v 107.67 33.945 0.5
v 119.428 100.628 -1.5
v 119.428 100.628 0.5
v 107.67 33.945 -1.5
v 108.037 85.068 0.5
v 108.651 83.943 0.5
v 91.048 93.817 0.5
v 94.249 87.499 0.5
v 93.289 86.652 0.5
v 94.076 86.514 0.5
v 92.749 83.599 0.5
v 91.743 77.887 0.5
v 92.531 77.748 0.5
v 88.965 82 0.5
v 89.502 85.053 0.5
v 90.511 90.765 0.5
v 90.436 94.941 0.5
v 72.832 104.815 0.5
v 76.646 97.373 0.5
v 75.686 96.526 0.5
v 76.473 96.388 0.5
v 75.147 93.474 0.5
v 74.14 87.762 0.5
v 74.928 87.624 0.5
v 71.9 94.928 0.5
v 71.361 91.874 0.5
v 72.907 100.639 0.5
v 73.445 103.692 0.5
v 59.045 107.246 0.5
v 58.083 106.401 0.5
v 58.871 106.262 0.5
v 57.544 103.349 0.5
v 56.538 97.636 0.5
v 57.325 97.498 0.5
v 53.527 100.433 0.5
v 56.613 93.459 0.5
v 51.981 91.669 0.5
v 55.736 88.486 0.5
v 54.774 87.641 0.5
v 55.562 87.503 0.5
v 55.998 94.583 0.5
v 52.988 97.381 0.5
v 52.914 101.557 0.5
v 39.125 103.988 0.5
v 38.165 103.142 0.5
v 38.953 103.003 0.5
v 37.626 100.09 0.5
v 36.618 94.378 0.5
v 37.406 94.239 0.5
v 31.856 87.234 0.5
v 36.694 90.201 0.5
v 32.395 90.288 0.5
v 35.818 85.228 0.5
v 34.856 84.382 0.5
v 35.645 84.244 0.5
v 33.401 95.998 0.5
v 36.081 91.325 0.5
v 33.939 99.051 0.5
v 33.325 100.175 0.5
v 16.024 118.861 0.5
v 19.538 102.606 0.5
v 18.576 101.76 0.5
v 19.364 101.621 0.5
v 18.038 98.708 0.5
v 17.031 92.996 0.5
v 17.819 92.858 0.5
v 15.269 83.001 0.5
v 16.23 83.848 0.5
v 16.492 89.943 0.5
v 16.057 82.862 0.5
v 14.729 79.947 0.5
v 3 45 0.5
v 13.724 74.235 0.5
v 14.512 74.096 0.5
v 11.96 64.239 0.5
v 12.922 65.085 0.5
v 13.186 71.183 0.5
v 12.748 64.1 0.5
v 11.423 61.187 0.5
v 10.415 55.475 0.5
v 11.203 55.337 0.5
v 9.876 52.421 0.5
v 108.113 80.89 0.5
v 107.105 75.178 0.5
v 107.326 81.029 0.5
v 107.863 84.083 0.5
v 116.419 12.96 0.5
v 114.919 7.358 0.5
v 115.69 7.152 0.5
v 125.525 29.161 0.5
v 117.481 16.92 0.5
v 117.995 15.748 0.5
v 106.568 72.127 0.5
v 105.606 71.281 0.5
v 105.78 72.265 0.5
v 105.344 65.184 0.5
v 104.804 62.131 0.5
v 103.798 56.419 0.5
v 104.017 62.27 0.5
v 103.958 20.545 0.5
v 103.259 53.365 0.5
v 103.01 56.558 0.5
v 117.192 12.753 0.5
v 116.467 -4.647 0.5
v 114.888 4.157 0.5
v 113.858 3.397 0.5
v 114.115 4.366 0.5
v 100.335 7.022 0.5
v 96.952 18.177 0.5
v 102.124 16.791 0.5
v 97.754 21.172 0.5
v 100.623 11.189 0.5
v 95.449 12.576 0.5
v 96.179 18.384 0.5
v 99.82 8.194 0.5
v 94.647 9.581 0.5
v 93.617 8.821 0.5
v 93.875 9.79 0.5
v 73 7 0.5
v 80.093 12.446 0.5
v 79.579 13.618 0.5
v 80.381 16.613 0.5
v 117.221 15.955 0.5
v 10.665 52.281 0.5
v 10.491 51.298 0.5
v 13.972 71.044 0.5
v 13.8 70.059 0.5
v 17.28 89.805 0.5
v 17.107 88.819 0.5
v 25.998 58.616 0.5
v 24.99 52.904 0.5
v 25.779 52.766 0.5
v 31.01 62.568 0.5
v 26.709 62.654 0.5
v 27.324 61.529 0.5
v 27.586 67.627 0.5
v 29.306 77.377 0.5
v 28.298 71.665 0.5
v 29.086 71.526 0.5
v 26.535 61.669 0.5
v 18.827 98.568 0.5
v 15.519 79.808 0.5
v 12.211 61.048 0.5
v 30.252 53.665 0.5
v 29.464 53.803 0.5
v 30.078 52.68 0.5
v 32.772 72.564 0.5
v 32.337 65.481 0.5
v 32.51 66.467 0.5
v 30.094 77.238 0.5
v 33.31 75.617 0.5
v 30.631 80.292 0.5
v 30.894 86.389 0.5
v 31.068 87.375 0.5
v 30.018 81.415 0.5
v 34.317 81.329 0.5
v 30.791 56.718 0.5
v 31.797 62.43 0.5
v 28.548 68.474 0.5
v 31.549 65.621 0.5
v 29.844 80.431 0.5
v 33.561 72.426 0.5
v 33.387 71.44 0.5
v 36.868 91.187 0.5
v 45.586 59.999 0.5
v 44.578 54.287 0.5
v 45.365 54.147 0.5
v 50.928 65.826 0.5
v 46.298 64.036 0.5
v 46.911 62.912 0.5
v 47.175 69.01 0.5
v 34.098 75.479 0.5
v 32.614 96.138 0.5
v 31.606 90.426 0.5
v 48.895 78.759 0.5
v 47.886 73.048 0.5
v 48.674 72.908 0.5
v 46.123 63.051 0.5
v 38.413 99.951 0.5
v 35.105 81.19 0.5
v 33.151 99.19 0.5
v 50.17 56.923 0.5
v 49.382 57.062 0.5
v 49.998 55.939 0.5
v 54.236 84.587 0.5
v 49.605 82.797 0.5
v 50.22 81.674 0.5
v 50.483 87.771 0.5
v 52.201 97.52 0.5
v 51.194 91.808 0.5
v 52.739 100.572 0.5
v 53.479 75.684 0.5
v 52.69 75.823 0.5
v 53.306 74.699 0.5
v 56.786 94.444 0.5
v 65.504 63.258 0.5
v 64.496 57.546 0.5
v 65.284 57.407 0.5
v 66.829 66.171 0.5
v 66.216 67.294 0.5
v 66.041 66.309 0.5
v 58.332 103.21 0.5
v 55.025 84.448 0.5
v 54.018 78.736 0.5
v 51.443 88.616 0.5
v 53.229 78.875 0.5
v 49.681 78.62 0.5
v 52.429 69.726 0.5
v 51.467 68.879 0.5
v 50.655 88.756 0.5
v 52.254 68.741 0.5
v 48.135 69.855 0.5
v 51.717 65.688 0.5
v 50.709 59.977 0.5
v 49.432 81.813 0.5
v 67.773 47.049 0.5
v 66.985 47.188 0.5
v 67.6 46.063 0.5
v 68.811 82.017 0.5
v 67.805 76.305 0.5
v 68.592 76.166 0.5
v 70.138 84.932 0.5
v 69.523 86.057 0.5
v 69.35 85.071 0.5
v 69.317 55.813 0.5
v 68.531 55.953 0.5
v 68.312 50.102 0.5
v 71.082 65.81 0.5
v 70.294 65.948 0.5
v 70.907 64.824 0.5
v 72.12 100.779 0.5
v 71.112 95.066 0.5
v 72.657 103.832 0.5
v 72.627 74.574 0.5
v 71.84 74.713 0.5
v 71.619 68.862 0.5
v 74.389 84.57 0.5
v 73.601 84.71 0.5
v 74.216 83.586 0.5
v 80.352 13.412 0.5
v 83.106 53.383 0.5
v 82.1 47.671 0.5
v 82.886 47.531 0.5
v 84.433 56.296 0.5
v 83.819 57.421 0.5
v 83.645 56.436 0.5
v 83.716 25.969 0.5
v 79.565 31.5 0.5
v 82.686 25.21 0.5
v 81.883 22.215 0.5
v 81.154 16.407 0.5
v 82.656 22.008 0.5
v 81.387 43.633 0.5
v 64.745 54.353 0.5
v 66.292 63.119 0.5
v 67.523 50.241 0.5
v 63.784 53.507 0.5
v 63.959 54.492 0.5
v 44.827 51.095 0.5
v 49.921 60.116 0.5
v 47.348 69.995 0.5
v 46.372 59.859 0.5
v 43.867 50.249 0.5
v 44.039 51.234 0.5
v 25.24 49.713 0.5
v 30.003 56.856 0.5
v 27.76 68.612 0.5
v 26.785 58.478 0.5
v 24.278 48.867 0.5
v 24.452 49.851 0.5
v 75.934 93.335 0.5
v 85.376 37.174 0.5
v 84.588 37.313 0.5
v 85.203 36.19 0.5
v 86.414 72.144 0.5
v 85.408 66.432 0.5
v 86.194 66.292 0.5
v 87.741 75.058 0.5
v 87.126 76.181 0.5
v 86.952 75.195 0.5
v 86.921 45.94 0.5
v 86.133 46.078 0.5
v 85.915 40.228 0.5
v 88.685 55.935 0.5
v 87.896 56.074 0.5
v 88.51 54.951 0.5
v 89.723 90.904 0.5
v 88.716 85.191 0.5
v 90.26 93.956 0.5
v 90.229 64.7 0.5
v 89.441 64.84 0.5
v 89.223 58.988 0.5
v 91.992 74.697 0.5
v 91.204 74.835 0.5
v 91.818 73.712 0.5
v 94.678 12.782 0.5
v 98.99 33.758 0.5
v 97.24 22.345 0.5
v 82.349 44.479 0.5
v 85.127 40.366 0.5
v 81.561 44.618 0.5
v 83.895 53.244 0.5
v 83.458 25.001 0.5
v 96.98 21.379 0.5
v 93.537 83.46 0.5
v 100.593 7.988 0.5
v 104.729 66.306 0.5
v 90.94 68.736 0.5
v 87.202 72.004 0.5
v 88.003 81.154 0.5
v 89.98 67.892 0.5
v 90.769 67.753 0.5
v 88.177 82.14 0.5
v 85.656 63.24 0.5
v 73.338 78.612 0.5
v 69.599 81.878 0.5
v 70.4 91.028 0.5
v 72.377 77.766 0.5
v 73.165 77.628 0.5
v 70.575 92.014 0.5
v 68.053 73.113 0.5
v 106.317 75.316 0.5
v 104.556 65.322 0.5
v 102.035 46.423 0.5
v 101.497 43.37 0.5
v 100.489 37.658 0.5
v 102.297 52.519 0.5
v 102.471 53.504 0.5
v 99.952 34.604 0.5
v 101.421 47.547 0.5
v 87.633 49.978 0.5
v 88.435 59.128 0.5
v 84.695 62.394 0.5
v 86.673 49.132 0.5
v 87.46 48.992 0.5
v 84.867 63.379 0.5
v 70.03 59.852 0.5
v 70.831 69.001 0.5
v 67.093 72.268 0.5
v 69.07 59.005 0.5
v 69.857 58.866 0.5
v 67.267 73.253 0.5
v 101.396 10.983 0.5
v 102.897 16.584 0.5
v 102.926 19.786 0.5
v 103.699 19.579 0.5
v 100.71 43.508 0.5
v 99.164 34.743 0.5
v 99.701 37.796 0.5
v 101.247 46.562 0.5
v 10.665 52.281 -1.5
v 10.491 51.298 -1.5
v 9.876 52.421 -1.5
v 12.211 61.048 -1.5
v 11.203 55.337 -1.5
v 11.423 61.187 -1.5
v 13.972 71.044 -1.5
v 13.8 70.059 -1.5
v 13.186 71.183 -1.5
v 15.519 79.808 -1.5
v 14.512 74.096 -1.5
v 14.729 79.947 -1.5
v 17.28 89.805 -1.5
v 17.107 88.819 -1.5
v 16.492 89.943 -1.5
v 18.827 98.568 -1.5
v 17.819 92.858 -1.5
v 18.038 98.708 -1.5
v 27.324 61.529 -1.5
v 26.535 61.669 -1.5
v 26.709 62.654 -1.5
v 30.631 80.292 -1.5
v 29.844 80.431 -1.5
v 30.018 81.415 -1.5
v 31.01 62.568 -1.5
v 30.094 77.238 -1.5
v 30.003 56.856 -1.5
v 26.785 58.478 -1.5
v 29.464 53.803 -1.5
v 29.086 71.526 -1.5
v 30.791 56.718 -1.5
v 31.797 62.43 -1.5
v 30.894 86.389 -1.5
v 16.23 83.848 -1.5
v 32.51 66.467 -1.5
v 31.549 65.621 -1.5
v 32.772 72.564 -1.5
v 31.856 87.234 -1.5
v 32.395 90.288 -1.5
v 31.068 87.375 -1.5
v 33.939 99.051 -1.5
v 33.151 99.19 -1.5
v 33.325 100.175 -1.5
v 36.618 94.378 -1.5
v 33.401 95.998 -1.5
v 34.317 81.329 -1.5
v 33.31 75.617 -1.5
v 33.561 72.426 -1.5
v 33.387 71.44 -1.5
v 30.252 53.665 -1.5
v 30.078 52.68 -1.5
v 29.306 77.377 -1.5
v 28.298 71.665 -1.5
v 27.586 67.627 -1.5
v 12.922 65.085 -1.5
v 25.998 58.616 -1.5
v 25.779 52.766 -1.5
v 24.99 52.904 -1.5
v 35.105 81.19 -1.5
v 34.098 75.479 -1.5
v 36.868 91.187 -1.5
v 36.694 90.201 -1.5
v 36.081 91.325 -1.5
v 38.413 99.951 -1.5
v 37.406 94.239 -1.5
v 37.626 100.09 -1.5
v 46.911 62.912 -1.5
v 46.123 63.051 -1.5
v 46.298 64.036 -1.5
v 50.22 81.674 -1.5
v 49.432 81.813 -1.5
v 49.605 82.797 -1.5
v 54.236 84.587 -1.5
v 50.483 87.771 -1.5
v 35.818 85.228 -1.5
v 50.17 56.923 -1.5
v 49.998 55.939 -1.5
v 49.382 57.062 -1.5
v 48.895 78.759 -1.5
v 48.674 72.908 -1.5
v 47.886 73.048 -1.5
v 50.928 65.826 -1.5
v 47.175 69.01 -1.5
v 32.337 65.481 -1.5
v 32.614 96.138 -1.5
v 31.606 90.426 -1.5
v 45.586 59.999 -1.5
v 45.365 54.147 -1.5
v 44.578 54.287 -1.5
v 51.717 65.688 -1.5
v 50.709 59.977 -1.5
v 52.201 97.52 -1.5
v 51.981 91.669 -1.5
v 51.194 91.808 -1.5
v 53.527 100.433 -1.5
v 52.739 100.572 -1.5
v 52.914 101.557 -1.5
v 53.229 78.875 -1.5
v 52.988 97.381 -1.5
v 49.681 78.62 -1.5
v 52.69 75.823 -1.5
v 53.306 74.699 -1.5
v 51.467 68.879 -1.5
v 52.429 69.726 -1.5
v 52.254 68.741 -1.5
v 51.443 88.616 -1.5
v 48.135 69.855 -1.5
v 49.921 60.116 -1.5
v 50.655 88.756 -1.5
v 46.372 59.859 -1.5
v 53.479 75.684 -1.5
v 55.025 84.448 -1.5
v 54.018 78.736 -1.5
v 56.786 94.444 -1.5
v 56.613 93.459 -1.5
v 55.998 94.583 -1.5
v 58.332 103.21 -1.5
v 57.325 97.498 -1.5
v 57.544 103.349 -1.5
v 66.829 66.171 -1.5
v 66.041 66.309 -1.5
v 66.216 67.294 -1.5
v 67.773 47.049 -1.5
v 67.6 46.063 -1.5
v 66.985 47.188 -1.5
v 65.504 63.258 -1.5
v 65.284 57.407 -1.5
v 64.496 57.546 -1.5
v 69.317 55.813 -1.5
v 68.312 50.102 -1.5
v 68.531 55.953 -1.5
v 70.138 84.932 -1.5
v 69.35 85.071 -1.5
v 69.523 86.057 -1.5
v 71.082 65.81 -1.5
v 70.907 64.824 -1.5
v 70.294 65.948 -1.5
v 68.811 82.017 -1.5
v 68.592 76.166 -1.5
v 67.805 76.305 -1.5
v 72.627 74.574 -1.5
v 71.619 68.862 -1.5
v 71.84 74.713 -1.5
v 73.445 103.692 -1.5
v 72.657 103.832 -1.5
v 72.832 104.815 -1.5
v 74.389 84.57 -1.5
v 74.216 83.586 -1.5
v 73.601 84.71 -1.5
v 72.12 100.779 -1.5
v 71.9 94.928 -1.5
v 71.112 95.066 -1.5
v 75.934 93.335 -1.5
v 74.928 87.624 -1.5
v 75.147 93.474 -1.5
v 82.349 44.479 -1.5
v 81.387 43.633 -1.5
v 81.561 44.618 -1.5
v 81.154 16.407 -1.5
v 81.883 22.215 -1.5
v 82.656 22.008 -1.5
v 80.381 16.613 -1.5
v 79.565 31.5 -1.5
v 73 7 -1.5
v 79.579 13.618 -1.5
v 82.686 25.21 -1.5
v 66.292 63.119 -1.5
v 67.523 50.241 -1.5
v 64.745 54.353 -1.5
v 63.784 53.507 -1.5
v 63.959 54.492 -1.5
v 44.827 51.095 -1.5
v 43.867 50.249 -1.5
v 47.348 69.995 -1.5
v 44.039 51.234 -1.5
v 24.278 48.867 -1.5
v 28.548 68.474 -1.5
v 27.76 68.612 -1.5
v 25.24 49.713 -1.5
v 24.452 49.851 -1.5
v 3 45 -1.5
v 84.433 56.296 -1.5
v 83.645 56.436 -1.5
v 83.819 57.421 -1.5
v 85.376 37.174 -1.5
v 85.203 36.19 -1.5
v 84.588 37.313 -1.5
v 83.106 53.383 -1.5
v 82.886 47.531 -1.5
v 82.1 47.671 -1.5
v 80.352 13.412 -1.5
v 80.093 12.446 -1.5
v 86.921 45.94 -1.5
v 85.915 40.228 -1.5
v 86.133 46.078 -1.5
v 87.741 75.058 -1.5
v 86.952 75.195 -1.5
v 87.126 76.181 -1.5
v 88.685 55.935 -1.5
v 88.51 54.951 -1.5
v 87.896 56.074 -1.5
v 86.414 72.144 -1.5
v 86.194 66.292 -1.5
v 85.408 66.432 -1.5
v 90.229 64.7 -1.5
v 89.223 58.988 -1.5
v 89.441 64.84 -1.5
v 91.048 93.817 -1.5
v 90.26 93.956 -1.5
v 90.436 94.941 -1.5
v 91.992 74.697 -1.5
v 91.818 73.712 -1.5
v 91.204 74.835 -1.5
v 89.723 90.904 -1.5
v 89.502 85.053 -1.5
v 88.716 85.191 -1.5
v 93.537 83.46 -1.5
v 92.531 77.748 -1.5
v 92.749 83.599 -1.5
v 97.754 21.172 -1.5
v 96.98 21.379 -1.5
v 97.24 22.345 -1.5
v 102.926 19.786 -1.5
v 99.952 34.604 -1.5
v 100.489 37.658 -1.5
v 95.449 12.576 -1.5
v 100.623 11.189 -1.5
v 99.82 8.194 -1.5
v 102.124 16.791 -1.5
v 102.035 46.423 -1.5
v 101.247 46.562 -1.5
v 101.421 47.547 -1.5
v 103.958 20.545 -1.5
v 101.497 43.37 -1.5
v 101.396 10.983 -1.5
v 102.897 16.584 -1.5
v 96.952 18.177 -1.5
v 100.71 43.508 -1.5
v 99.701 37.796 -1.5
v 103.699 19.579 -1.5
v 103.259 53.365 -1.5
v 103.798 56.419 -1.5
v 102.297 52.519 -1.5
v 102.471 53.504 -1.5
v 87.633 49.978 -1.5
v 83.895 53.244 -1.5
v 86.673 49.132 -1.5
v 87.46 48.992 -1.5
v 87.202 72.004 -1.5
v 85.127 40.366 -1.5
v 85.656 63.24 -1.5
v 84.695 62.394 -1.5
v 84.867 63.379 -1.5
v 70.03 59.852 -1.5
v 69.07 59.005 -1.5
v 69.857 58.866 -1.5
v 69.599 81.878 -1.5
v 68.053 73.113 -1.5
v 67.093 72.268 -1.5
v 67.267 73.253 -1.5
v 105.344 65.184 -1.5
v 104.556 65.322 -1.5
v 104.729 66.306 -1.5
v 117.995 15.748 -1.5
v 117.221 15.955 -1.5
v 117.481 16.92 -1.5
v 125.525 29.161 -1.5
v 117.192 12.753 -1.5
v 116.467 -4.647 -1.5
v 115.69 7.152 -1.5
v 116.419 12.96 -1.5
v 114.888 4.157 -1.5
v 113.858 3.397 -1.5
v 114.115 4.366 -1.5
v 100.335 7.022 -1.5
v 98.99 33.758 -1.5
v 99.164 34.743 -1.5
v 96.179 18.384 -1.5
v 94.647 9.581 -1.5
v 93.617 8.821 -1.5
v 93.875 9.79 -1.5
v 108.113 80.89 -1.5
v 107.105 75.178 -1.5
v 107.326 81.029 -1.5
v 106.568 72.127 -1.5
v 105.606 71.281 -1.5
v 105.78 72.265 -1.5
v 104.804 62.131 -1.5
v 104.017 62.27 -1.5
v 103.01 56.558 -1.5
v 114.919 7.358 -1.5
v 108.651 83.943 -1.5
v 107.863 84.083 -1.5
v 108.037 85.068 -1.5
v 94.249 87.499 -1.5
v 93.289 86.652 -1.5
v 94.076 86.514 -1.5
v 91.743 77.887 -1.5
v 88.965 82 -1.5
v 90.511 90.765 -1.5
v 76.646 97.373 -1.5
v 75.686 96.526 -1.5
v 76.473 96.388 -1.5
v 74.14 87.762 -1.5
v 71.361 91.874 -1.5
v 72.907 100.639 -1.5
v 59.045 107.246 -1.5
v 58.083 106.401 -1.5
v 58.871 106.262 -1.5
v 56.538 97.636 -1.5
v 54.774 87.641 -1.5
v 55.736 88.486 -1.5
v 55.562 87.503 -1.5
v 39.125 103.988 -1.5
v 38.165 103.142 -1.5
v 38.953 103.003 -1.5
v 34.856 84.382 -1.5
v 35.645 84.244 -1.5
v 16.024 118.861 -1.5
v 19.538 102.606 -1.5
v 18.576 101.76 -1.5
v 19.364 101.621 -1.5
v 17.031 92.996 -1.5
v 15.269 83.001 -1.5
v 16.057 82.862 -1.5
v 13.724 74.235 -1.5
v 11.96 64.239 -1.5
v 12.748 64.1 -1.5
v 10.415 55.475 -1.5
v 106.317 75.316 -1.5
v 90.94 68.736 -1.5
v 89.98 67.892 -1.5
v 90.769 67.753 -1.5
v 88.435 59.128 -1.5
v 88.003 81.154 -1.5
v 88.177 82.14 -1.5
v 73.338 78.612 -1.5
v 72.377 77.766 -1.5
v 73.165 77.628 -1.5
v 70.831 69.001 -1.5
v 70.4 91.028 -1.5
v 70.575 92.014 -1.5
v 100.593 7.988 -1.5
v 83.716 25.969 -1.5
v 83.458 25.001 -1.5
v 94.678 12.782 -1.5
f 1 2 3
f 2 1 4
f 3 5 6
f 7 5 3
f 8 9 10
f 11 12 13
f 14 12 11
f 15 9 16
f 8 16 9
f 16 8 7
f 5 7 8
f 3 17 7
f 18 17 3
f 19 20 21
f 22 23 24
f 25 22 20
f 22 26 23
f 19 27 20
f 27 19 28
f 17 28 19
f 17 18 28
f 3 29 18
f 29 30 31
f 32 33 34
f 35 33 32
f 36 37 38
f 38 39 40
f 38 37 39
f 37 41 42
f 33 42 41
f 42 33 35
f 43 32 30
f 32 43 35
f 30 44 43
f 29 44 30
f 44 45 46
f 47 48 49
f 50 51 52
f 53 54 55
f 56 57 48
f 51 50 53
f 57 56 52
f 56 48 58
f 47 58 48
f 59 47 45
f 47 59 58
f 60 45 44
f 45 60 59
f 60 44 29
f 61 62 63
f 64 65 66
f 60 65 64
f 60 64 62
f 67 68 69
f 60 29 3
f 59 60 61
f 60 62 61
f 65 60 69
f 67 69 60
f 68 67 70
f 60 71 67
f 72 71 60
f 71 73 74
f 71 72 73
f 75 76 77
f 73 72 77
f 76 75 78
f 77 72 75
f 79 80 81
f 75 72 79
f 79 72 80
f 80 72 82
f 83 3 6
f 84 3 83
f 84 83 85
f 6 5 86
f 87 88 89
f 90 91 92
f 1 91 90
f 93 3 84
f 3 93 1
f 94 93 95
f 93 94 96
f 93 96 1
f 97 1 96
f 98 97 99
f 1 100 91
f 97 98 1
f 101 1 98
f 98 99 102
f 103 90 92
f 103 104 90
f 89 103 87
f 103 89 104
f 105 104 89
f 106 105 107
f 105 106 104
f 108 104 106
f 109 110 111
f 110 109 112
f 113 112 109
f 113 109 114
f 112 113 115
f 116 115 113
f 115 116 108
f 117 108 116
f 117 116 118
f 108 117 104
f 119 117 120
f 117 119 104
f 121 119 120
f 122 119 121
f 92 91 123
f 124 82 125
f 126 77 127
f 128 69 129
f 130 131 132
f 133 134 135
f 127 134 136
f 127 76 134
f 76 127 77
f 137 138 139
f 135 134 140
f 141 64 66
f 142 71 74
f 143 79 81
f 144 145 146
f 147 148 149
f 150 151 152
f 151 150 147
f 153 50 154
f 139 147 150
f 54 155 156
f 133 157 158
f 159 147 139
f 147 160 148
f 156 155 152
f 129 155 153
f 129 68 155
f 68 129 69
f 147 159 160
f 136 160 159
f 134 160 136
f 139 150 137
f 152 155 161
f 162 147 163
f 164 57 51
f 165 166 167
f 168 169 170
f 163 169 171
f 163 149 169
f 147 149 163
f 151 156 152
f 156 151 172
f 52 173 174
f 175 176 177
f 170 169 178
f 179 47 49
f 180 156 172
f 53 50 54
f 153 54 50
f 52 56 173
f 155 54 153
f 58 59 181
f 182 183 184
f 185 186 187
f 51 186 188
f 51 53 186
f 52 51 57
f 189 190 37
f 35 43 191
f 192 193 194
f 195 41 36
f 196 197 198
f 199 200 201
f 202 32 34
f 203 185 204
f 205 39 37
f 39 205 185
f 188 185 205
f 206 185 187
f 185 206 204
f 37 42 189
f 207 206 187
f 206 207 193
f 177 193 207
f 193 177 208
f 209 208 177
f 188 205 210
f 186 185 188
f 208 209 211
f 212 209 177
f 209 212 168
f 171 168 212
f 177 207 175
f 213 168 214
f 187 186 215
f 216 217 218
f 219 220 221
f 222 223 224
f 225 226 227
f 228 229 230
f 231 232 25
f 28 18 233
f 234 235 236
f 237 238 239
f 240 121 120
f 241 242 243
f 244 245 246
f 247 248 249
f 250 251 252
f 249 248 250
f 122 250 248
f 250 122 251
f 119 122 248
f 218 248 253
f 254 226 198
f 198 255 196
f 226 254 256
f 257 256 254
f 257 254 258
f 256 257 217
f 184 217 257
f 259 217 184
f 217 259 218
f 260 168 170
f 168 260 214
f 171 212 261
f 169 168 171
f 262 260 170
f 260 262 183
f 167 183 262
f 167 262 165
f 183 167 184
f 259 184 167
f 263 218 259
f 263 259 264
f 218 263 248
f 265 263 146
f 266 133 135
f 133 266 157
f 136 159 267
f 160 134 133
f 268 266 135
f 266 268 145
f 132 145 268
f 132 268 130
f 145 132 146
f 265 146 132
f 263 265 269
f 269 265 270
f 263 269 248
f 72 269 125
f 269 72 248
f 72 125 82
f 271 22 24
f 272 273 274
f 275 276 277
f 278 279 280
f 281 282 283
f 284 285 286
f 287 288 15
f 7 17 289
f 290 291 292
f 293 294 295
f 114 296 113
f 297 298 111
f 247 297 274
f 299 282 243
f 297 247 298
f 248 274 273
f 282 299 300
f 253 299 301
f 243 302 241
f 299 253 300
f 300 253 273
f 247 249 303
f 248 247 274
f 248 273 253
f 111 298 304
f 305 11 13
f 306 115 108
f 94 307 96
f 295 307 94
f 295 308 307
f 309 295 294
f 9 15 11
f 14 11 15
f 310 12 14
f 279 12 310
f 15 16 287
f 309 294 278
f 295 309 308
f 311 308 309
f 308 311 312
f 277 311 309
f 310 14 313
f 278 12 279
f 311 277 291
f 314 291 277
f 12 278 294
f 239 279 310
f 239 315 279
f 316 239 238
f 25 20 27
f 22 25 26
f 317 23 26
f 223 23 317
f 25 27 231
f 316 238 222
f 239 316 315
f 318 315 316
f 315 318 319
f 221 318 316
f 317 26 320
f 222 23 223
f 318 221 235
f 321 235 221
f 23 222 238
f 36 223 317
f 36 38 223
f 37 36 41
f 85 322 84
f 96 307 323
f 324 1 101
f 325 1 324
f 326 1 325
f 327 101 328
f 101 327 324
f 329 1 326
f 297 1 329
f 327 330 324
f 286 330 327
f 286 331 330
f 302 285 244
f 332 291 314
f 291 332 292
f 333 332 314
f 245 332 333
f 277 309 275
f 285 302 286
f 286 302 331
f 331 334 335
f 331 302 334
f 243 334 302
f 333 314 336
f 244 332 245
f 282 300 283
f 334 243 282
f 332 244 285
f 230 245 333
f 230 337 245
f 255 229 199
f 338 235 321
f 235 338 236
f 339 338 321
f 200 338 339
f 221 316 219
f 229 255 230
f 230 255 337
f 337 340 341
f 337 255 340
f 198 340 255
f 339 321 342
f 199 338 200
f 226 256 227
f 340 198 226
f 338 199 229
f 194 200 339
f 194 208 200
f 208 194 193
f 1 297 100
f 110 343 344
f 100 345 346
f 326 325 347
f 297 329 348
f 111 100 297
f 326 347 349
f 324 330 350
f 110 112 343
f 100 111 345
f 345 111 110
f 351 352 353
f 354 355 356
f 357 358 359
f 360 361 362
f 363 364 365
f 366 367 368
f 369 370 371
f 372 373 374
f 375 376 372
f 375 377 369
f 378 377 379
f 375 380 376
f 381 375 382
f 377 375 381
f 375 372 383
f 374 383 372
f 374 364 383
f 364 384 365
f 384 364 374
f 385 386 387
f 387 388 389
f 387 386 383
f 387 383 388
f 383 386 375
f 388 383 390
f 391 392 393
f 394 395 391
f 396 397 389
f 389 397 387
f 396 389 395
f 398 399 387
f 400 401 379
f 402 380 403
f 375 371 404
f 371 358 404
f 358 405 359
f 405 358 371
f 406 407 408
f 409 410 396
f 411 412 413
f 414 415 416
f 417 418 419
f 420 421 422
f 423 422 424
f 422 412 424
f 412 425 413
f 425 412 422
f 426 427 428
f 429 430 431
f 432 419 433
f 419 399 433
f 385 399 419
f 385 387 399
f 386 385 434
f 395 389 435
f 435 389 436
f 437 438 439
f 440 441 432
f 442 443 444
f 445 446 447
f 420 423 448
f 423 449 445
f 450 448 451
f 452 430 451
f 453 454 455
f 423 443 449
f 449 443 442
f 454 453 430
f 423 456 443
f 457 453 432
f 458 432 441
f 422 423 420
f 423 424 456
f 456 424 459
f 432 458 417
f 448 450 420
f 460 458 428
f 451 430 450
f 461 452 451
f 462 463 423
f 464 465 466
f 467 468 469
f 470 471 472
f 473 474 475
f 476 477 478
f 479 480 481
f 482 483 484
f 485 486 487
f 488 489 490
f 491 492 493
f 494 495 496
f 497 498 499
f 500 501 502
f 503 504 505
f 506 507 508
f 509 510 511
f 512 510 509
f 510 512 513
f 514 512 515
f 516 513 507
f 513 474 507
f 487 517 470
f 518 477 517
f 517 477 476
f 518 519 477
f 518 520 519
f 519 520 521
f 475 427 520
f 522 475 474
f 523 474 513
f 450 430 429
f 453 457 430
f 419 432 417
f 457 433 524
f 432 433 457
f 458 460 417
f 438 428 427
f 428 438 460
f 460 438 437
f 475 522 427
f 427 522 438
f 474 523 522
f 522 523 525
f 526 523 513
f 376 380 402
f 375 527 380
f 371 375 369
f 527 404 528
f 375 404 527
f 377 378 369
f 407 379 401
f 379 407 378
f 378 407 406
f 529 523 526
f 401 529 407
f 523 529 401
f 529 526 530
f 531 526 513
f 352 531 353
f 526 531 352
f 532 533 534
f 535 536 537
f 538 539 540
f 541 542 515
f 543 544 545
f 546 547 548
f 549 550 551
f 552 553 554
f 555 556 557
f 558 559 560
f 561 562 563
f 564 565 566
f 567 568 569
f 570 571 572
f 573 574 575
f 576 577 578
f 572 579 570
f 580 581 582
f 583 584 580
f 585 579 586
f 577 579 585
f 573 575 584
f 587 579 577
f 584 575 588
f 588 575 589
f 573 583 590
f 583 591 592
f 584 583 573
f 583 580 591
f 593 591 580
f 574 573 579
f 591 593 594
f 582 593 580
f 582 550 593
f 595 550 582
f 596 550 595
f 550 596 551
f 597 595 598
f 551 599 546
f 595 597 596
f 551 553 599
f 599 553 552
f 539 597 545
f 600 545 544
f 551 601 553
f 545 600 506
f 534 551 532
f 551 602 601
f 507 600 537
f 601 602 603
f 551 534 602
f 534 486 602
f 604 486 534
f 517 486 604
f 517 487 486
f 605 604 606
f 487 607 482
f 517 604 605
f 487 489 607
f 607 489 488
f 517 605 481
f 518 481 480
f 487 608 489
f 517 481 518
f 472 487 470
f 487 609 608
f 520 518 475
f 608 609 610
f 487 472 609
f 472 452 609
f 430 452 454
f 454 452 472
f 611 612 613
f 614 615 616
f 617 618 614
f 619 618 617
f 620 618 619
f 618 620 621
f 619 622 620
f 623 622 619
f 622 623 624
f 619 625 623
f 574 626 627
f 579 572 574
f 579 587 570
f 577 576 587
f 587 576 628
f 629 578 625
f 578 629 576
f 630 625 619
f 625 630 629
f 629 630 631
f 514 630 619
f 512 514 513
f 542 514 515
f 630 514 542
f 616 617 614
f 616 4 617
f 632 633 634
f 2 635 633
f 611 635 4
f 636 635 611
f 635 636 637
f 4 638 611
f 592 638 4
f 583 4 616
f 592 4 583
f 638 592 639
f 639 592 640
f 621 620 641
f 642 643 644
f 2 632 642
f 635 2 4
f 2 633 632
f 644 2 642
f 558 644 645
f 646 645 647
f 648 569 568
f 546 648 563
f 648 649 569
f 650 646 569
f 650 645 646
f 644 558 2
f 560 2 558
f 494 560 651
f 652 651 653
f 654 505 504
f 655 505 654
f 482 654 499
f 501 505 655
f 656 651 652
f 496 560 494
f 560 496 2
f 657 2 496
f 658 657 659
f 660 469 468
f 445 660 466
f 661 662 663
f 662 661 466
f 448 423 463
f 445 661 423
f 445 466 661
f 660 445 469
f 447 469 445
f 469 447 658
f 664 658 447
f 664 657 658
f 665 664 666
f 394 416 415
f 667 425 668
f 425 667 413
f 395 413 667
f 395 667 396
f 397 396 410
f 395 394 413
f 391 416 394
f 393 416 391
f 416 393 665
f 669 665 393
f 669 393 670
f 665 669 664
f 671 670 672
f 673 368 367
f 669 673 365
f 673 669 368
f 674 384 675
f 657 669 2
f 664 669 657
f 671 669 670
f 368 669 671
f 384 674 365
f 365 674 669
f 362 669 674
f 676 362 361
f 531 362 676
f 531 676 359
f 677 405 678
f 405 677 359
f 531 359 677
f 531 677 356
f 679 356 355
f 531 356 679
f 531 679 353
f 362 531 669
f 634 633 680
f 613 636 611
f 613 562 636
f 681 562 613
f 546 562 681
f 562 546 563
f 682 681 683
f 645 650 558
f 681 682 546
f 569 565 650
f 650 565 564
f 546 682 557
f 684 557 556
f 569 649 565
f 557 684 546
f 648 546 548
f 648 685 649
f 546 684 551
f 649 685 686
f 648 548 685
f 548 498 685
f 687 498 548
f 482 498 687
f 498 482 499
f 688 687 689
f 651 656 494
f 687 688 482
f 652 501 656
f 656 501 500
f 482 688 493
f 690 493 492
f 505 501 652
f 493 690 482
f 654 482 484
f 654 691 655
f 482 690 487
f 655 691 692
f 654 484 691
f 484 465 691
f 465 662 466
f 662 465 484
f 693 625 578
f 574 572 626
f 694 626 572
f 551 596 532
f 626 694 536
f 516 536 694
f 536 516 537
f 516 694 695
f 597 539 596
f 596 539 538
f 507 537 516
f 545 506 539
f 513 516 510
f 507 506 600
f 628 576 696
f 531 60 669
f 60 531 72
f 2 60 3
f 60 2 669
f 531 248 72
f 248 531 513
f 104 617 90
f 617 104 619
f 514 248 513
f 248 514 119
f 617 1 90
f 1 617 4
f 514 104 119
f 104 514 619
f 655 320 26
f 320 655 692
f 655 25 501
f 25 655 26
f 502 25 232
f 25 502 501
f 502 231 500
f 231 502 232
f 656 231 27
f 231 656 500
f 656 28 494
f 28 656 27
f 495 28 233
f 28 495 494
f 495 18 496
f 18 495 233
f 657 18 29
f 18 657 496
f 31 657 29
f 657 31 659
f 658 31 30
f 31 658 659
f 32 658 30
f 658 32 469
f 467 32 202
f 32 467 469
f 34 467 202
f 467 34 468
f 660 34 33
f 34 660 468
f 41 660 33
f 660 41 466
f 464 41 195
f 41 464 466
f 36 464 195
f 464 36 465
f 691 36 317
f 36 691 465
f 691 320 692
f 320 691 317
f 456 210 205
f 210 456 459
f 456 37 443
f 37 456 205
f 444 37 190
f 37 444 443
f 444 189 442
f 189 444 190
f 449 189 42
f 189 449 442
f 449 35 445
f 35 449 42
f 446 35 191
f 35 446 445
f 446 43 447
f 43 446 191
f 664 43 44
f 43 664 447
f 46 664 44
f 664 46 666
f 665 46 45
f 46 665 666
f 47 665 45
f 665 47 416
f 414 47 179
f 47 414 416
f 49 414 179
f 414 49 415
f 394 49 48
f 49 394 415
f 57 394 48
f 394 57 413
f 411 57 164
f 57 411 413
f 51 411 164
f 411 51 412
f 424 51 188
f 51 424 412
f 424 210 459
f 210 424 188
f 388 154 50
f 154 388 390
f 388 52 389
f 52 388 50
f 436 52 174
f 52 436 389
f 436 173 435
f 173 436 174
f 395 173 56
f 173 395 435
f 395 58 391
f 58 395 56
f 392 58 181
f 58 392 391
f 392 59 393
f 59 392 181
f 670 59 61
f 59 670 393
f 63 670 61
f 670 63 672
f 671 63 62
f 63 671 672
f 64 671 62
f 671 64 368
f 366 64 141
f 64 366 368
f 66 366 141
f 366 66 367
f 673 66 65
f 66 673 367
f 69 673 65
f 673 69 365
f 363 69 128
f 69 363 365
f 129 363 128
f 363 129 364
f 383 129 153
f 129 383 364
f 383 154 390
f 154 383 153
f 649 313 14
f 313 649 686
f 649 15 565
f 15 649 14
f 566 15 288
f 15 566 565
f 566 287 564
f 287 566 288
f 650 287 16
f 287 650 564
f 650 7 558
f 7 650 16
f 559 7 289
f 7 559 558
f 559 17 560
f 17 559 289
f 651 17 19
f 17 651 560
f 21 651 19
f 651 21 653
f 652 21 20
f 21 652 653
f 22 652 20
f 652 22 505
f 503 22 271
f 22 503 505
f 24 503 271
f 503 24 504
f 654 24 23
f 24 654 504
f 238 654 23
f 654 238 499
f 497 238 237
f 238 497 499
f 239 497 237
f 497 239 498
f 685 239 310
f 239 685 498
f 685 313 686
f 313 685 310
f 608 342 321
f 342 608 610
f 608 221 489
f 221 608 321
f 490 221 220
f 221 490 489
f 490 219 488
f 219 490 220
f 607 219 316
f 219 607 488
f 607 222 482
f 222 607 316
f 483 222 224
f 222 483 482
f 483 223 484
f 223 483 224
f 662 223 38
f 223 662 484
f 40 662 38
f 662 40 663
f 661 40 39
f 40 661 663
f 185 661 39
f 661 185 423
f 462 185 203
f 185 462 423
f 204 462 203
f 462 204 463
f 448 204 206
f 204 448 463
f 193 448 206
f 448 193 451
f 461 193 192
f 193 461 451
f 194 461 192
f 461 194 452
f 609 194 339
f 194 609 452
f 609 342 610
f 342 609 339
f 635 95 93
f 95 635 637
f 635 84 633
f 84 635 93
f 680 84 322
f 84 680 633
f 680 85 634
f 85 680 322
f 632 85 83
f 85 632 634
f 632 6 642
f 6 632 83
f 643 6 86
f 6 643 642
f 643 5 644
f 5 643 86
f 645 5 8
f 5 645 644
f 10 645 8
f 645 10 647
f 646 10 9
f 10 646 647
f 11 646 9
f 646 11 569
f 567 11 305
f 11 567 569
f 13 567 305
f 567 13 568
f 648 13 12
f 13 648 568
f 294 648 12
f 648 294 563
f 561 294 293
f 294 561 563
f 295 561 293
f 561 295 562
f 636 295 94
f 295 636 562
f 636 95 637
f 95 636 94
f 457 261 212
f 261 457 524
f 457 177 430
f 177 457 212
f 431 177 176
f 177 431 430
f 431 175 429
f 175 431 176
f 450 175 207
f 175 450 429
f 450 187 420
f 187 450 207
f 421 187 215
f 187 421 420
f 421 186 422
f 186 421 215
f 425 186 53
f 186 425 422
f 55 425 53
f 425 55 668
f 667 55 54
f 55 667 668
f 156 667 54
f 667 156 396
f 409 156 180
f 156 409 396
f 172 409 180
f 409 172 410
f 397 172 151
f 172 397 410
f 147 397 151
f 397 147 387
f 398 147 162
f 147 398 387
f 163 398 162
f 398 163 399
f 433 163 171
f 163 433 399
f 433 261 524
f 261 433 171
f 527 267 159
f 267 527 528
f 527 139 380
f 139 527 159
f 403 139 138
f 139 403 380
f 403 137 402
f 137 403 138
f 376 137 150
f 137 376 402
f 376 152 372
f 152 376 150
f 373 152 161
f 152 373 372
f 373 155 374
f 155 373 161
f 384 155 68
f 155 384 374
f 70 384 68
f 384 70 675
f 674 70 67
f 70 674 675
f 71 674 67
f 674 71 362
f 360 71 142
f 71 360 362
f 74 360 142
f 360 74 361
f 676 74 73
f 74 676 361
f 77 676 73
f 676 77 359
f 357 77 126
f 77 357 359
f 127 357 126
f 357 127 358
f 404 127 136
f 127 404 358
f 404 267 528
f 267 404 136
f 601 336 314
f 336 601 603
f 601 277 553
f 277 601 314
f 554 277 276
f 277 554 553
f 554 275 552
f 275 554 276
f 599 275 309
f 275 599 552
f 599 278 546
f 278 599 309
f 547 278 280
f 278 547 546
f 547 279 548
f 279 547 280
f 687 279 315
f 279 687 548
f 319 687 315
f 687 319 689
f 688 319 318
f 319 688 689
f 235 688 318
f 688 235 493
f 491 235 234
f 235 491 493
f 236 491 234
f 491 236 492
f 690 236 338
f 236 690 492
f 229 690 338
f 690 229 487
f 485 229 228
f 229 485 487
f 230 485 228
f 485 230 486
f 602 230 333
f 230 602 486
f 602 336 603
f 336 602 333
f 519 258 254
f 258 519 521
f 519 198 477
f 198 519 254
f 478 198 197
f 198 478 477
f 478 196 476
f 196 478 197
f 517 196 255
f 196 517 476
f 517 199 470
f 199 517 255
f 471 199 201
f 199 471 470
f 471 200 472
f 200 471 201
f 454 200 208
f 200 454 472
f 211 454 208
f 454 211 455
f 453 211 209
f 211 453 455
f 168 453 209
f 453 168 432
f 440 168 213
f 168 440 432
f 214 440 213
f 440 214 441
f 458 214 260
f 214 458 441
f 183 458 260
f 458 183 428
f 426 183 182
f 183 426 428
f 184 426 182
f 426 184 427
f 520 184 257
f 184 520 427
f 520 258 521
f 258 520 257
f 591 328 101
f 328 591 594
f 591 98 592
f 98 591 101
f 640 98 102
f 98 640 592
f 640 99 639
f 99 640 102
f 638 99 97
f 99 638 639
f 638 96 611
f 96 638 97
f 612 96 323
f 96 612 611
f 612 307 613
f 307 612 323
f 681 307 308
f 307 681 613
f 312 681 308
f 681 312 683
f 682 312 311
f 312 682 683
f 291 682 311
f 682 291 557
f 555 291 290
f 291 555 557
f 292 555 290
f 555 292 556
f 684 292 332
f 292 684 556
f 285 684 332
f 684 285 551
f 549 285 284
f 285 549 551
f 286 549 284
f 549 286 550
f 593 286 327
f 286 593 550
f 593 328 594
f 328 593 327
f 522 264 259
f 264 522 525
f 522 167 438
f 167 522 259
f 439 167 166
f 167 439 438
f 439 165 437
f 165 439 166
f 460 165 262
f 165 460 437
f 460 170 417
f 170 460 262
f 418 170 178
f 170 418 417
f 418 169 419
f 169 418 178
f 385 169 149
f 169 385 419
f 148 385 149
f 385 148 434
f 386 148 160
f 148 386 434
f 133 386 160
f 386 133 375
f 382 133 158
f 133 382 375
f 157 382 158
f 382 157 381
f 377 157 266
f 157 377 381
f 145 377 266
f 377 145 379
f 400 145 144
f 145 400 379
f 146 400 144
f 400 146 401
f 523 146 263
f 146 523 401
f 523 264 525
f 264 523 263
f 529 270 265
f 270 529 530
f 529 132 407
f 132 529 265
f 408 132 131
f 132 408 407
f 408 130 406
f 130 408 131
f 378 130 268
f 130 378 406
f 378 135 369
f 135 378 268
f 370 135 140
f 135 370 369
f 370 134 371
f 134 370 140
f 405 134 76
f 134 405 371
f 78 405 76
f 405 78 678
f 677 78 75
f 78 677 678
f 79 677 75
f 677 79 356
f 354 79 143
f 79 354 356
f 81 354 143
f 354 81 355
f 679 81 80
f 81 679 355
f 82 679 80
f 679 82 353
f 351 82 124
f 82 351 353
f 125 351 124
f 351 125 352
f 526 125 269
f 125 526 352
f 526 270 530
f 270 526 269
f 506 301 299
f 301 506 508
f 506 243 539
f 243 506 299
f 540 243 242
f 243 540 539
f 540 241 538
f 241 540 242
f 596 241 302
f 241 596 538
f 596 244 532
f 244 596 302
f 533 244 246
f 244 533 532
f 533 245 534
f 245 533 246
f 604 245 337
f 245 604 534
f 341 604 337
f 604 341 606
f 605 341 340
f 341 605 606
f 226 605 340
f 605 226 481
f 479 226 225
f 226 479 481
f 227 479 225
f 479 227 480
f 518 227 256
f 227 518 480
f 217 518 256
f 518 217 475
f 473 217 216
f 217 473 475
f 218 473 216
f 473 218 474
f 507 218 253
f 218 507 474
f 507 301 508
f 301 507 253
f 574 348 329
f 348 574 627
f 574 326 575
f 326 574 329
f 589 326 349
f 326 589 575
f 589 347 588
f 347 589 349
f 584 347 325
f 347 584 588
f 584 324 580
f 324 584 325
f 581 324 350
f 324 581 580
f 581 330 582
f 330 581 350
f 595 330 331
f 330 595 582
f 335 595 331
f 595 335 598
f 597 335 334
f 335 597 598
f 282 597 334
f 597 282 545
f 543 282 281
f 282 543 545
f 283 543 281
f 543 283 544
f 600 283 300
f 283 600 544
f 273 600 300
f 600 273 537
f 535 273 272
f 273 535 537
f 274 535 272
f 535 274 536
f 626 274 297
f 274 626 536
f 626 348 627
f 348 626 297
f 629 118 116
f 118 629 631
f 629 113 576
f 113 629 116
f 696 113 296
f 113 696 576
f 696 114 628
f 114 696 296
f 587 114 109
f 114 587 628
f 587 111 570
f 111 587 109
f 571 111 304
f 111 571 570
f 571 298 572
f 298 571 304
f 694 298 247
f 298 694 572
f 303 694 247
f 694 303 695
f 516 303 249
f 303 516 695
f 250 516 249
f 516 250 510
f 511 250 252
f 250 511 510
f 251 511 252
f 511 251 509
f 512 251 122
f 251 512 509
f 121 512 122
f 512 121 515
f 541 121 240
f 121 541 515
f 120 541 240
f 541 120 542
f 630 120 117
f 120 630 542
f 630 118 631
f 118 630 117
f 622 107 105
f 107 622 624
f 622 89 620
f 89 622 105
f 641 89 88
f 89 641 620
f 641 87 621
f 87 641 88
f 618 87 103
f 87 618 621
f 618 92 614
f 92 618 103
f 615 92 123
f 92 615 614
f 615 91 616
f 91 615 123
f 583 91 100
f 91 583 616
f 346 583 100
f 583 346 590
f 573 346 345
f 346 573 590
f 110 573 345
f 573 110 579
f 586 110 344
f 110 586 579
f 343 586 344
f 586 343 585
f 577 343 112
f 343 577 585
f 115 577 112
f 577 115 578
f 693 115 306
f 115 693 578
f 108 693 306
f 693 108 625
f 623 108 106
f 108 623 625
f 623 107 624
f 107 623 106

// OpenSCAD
difference() {
    union() {
        translate([ 3, 45, -1.5 ])
            rotate([ 0, 0, -10 ])
                cube(size = [105, 75, 2]);
        
        translate([ 73, 7, -1.5 ])
            rotate([ 0, 0, -15 ])
                cube(size = [45, 35, 2]);
    }
    
    linear_extrude(height = 4, center = true, convexity = 10)
        import(file = "cutout4.dxf", layer = "0");
}
